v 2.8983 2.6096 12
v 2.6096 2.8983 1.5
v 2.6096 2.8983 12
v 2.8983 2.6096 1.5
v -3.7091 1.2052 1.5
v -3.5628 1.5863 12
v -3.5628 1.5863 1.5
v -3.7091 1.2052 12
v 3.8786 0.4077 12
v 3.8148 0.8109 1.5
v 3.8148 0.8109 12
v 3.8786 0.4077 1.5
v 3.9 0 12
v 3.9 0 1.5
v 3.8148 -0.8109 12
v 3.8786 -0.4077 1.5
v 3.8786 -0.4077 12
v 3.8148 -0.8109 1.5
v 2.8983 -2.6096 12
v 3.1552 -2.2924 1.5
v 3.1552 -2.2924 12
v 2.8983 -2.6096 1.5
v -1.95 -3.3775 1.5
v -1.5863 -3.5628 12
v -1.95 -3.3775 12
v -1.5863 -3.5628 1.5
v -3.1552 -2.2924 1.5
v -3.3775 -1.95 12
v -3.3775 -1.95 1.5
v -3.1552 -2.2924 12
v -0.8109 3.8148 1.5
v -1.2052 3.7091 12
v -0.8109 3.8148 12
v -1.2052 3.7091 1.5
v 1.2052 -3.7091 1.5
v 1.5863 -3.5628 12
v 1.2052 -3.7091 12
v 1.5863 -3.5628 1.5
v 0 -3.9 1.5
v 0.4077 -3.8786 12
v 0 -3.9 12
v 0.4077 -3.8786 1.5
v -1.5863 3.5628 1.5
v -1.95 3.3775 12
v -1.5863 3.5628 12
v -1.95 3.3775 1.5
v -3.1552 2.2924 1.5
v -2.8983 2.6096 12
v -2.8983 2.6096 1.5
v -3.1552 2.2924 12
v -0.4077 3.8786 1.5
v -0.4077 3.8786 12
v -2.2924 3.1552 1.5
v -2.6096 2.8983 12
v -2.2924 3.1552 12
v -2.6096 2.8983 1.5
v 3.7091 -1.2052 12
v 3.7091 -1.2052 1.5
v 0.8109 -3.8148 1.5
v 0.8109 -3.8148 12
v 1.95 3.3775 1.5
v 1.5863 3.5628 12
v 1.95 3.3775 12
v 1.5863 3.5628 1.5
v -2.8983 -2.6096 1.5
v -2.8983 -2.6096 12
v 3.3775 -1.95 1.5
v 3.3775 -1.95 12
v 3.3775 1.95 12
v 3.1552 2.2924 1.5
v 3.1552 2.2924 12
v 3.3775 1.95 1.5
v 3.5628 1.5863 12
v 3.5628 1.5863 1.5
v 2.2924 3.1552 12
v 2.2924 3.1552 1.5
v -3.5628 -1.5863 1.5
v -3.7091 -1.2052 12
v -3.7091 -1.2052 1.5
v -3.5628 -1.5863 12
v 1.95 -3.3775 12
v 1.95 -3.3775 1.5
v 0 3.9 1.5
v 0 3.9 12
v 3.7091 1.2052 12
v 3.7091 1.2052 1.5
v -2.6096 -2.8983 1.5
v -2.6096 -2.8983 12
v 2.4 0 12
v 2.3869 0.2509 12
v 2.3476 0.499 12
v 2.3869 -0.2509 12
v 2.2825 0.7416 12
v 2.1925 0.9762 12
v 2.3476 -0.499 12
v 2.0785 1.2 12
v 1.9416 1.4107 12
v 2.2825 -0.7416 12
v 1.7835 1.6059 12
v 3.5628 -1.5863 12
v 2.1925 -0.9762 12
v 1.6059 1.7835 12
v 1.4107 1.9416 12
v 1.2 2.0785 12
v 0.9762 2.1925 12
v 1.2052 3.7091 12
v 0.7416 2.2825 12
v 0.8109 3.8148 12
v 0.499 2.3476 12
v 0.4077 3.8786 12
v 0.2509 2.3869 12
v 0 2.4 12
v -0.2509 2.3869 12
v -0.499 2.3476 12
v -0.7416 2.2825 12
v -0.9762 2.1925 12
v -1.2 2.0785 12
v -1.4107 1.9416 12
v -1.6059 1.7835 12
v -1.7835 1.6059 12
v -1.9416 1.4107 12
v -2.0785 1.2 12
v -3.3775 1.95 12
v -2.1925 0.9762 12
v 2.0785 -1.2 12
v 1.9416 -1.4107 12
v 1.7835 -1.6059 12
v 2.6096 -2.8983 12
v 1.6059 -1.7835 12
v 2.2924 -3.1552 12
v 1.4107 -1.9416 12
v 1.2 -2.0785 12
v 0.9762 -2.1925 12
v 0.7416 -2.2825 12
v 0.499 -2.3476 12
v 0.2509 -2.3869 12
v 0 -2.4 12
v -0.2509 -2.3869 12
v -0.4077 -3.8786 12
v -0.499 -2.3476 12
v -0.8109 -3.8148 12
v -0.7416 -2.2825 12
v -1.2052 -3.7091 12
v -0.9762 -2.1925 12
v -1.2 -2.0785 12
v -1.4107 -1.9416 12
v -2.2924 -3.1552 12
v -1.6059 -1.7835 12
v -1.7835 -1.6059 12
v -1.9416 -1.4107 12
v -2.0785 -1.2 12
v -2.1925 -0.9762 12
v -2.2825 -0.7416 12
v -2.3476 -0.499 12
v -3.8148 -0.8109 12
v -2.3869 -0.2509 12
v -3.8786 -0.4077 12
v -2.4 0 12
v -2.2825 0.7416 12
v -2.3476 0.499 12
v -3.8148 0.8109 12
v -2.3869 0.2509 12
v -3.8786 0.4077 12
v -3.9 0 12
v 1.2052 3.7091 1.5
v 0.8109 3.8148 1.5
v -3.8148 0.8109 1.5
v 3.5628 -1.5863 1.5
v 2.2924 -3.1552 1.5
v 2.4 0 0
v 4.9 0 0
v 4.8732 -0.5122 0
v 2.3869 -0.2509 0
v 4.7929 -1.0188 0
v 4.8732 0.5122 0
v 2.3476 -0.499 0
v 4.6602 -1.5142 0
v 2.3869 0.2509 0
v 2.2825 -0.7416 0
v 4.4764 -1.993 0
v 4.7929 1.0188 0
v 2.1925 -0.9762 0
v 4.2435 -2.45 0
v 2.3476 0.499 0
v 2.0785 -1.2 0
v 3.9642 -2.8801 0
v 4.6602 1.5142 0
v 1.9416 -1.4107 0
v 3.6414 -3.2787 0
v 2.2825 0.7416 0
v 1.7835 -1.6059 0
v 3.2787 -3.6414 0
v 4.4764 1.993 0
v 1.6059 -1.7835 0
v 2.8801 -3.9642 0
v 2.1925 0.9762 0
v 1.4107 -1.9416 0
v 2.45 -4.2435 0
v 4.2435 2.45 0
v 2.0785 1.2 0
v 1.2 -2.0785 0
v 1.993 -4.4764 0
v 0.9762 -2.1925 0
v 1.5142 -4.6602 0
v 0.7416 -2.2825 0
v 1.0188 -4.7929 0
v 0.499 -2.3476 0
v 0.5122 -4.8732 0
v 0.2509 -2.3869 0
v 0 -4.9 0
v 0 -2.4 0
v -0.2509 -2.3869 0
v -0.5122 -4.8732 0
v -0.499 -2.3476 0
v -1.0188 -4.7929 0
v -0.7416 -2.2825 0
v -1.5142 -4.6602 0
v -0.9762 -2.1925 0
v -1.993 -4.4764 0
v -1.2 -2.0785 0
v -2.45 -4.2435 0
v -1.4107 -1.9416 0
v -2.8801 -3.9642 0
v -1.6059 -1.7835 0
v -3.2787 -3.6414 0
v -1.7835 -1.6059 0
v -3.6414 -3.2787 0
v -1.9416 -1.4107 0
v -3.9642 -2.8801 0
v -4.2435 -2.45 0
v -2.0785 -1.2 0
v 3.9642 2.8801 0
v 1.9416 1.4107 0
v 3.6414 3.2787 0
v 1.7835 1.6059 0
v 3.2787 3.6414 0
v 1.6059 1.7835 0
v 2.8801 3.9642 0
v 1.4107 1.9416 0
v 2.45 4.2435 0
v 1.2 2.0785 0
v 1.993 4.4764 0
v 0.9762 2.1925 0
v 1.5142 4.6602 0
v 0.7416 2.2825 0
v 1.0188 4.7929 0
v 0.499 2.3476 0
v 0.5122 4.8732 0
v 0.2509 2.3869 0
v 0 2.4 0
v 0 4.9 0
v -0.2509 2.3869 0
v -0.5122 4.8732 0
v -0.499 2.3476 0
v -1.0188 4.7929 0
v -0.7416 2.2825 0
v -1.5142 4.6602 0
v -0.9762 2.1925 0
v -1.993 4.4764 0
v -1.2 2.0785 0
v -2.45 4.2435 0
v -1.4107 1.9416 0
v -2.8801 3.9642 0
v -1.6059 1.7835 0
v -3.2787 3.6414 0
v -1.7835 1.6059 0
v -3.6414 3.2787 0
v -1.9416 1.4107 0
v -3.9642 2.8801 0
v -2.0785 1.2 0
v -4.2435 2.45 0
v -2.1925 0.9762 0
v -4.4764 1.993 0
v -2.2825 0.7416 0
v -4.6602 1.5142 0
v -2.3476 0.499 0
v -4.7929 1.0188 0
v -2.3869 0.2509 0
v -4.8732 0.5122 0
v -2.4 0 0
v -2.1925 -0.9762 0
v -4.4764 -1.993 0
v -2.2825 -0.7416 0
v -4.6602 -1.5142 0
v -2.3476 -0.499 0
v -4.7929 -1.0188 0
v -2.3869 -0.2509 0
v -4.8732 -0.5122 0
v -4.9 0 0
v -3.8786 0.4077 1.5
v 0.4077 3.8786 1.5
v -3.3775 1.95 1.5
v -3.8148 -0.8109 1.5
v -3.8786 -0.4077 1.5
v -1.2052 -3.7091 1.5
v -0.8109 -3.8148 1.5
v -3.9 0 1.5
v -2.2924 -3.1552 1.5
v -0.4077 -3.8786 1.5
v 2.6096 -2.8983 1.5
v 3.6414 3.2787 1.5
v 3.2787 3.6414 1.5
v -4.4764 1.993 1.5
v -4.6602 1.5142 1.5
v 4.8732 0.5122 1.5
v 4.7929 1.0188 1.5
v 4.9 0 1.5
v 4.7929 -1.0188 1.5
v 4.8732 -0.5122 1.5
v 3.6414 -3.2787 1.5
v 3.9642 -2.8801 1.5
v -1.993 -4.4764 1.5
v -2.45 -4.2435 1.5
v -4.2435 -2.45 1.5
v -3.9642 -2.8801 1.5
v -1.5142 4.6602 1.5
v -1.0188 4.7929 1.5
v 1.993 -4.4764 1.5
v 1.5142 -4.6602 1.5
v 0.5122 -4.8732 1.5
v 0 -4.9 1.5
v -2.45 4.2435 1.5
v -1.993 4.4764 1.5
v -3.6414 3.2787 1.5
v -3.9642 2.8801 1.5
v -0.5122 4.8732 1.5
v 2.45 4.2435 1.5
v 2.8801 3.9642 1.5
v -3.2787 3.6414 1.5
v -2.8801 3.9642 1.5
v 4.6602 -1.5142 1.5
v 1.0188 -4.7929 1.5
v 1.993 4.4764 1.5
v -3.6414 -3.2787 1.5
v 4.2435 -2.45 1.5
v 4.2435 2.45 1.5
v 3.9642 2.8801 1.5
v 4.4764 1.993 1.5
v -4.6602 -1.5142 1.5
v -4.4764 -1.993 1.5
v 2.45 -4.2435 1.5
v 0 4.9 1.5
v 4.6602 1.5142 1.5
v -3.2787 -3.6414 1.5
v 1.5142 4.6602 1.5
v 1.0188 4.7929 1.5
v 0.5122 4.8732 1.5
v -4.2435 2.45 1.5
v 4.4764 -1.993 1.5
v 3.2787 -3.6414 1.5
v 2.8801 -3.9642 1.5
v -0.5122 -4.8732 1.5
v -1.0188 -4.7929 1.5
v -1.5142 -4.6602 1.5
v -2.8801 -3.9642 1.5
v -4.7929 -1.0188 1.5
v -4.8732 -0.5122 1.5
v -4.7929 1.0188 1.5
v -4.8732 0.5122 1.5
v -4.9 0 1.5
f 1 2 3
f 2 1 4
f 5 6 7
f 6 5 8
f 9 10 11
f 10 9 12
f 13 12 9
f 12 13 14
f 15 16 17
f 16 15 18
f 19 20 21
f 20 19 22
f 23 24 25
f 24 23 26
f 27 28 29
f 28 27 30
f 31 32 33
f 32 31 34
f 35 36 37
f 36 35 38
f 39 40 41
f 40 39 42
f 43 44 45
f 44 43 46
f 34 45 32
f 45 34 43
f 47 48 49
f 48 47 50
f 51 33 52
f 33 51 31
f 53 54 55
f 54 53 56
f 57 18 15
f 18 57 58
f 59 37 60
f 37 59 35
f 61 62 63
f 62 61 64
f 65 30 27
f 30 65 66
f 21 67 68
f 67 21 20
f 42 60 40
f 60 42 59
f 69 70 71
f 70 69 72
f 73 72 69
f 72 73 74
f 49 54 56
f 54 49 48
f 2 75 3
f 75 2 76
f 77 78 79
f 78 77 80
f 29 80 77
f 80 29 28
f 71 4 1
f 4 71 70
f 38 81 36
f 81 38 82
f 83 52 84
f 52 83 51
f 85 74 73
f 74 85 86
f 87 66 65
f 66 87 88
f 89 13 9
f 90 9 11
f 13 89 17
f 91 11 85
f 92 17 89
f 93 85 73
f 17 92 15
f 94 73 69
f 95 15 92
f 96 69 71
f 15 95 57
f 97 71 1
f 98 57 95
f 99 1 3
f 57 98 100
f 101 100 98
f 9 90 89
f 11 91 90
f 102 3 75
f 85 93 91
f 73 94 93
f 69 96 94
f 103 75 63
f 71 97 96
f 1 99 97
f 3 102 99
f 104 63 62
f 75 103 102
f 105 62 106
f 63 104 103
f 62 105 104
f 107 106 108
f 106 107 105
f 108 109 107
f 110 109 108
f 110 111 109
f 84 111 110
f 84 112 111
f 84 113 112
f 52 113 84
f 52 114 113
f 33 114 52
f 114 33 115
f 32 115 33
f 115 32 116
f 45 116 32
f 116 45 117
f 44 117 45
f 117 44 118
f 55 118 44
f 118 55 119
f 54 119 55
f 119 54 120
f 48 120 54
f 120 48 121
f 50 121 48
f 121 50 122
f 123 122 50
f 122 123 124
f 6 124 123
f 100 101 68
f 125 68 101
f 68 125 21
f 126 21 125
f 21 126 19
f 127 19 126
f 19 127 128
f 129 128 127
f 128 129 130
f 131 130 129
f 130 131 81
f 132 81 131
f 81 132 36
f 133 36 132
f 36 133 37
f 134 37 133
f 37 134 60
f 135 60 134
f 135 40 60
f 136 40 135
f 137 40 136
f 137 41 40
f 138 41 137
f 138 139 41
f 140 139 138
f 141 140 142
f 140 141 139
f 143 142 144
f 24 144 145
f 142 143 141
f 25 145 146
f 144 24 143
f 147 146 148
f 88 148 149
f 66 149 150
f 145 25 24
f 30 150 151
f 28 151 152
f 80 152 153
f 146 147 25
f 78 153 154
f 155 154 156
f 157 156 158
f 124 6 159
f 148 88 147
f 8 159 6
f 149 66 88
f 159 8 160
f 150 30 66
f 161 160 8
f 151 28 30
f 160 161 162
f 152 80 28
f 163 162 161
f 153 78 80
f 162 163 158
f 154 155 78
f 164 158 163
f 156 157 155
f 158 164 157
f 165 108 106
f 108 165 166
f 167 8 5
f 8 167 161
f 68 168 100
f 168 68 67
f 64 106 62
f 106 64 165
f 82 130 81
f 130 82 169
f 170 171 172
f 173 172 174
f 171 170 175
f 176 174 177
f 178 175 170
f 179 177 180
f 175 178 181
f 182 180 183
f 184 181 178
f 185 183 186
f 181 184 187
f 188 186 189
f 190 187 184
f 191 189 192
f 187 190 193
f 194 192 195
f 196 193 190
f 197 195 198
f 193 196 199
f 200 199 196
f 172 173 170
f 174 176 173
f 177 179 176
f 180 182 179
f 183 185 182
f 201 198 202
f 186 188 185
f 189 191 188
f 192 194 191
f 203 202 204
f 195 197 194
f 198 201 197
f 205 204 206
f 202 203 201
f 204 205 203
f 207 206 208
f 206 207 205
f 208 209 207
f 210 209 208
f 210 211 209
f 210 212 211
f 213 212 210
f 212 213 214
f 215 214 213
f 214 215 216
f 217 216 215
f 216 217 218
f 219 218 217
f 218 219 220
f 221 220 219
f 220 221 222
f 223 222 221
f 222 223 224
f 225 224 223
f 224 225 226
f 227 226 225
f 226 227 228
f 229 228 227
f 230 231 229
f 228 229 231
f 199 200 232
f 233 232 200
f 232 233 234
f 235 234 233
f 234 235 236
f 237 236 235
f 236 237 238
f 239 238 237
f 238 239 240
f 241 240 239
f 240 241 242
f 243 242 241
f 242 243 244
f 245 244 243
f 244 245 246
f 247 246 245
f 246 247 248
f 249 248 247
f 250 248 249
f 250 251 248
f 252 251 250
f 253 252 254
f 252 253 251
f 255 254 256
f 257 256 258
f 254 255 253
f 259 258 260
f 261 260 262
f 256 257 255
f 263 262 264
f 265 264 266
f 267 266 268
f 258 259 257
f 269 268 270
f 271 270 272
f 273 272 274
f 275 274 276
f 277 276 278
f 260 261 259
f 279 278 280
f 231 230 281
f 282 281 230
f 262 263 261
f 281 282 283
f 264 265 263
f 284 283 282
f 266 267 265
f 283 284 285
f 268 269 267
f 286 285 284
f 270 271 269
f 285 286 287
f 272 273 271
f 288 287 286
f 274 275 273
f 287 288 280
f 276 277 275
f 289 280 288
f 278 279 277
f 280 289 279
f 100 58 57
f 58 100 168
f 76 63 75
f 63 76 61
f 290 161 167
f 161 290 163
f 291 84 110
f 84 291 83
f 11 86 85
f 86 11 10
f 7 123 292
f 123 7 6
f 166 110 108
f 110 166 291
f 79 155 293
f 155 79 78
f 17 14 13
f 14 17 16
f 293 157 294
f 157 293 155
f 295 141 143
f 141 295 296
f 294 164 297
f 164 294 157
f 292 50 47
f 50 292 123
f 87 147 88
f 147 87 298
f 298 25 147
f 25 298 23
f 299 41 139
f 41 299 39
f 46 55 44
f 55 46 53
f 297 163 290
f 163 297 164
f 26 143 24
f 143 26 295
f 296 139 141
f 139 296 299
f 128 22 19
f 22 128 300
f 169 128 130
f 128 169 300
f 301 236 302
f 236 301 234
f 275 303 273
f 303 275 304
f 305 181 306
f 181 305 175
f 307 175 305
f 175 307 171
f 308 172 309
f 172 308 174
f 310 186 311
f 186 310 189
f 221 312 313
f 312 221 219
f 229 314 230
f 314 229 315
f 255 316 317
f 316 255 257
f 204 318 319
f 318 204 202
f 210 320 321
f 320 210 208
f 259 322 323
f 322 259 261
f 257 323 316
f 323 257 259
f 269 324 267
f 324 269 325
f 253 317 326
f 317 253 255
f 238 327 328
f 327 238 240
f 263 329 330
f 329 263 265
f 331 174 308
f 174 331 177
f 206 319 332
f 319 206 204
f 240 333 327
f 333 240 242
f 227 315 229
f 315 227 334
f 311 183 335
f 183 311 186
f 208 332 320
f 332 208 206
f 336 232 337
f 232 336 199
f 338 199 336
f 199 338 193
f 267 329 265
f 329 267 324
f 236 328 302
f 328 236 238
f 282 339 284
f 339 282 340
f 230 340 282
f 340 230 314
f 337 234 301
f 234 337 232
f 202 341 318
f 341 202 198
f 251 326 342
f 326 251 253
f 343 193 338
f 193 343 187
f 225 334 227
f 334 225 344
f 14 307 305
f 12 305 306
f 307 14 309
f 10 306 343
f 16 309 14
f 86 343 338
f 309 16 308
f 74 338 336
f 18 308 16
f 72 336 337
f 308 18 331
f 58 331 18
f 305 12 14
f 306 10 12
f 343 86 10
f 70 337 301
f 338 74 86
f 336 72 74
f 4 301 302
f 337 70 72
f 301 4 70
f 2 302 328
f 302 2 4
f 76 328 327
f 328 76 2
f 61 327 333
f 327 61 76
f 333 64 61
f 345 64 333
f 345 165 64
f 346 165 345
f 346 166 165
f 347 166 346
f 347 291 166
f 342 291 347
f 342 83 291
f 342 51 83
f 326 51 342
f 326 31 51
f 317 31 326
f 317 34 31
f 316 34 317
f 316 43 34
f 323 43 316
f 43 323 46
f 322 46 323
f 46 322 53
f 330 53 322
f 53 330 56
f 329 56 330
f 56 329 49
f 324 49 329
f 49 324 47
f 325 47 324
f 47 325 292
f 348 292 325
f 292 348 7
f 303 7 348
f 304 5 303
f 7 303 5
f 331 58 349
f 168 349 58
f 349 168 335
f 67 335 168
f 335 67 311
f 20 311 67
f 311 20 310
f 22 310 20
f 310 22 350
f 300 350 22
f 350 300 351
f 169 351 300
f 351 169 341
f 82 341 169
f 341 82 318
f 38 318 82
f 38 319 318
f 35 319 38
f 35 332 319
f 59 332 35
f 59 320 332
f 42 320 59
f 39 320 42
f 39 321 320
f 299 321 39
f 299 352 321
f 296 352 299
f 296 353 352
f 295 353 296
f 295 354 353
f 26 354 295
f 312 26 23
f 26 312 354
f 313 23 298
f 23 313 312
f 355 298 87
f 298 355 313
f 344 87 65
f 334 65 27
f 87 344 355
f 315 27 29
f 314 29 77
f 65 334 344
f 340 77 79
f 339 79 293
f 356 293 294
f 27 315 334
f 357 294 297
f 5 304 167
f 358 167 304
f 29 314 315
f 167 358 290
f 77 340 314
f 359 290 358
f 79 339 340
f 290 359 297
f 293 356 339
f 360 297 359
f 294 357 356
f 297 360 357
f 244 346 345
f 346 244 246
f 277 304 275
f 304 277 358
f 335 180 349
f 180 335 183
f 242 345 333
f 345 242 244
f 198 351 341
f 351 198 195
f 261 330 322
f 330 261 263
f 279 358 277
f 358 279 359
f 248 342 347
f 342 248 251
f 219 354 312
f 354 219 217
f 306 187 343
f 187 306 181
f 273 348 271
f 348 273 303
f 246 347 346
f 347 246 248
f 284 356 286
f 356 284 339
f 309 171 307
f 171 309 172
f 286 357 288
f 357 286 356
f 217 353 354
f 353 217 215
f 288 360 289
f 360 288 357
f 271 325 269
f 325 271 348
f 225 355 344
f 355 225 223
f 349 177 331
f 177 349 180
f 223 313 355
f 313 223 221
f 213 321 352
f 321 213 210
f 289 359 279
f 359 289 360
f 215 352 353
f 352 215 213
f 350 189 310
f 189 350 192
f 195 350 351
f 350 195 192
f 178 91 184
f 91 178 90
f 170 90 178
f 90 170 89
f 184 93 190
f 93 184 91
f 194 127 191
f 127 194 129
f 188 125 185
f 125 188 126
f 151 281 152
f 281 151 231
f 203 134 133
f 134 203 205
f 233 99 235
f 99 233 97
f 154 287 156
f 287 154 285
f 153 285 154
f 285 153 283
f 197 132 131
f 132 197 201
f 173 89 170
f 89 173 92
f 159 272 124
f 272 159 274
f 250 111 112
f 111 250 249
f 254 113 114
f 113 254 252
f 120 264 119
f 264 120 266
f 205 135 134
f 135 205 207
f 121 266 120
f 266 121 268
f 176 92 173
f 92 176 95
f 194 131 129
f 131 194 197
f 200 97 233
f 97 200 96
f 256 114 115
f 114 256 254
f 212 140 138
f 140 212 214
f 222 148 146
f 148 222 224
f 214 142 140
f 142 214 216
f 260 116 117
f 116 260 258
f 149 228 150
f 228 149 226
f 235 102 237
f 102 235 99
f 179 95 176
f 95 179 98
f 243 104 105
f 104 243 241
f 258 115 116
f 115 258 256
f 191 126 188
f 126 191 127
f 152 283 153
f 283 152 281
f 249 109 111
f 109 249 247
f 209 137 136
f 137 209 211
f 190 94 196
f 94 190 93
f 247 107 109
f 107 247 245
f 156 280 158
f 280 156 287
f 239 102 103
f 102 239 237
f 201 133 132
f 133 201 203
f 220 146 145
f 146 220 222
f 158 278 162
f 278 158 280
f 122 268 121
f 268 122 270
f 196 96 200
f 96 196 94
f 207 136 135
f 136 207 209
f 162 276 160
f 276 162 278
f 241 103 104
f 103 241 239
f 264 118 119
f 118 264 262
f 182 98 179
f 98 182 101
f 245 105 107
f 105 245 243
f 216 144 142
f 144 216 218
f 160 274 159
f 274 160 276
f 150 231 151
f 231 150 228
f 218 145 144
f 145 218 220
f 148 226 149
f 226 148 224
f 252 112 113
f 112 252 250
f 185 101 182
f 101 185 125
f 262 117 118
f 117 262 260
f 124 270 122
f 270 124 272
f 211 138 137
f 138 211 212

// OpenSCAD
// Blind-rivet body.
$fn = 60;
eps = 0.02;
shank_d = 4.8;
head_d = 9;
length = 12;
difference() { union() { cylinder(d=shank_d+3,h=length); cylinder(d=max(head_d, shank_d+5),h=1.5); } translate([0,0,-eps]) cylinder(d=shank_d,h=length+2*eps); }
